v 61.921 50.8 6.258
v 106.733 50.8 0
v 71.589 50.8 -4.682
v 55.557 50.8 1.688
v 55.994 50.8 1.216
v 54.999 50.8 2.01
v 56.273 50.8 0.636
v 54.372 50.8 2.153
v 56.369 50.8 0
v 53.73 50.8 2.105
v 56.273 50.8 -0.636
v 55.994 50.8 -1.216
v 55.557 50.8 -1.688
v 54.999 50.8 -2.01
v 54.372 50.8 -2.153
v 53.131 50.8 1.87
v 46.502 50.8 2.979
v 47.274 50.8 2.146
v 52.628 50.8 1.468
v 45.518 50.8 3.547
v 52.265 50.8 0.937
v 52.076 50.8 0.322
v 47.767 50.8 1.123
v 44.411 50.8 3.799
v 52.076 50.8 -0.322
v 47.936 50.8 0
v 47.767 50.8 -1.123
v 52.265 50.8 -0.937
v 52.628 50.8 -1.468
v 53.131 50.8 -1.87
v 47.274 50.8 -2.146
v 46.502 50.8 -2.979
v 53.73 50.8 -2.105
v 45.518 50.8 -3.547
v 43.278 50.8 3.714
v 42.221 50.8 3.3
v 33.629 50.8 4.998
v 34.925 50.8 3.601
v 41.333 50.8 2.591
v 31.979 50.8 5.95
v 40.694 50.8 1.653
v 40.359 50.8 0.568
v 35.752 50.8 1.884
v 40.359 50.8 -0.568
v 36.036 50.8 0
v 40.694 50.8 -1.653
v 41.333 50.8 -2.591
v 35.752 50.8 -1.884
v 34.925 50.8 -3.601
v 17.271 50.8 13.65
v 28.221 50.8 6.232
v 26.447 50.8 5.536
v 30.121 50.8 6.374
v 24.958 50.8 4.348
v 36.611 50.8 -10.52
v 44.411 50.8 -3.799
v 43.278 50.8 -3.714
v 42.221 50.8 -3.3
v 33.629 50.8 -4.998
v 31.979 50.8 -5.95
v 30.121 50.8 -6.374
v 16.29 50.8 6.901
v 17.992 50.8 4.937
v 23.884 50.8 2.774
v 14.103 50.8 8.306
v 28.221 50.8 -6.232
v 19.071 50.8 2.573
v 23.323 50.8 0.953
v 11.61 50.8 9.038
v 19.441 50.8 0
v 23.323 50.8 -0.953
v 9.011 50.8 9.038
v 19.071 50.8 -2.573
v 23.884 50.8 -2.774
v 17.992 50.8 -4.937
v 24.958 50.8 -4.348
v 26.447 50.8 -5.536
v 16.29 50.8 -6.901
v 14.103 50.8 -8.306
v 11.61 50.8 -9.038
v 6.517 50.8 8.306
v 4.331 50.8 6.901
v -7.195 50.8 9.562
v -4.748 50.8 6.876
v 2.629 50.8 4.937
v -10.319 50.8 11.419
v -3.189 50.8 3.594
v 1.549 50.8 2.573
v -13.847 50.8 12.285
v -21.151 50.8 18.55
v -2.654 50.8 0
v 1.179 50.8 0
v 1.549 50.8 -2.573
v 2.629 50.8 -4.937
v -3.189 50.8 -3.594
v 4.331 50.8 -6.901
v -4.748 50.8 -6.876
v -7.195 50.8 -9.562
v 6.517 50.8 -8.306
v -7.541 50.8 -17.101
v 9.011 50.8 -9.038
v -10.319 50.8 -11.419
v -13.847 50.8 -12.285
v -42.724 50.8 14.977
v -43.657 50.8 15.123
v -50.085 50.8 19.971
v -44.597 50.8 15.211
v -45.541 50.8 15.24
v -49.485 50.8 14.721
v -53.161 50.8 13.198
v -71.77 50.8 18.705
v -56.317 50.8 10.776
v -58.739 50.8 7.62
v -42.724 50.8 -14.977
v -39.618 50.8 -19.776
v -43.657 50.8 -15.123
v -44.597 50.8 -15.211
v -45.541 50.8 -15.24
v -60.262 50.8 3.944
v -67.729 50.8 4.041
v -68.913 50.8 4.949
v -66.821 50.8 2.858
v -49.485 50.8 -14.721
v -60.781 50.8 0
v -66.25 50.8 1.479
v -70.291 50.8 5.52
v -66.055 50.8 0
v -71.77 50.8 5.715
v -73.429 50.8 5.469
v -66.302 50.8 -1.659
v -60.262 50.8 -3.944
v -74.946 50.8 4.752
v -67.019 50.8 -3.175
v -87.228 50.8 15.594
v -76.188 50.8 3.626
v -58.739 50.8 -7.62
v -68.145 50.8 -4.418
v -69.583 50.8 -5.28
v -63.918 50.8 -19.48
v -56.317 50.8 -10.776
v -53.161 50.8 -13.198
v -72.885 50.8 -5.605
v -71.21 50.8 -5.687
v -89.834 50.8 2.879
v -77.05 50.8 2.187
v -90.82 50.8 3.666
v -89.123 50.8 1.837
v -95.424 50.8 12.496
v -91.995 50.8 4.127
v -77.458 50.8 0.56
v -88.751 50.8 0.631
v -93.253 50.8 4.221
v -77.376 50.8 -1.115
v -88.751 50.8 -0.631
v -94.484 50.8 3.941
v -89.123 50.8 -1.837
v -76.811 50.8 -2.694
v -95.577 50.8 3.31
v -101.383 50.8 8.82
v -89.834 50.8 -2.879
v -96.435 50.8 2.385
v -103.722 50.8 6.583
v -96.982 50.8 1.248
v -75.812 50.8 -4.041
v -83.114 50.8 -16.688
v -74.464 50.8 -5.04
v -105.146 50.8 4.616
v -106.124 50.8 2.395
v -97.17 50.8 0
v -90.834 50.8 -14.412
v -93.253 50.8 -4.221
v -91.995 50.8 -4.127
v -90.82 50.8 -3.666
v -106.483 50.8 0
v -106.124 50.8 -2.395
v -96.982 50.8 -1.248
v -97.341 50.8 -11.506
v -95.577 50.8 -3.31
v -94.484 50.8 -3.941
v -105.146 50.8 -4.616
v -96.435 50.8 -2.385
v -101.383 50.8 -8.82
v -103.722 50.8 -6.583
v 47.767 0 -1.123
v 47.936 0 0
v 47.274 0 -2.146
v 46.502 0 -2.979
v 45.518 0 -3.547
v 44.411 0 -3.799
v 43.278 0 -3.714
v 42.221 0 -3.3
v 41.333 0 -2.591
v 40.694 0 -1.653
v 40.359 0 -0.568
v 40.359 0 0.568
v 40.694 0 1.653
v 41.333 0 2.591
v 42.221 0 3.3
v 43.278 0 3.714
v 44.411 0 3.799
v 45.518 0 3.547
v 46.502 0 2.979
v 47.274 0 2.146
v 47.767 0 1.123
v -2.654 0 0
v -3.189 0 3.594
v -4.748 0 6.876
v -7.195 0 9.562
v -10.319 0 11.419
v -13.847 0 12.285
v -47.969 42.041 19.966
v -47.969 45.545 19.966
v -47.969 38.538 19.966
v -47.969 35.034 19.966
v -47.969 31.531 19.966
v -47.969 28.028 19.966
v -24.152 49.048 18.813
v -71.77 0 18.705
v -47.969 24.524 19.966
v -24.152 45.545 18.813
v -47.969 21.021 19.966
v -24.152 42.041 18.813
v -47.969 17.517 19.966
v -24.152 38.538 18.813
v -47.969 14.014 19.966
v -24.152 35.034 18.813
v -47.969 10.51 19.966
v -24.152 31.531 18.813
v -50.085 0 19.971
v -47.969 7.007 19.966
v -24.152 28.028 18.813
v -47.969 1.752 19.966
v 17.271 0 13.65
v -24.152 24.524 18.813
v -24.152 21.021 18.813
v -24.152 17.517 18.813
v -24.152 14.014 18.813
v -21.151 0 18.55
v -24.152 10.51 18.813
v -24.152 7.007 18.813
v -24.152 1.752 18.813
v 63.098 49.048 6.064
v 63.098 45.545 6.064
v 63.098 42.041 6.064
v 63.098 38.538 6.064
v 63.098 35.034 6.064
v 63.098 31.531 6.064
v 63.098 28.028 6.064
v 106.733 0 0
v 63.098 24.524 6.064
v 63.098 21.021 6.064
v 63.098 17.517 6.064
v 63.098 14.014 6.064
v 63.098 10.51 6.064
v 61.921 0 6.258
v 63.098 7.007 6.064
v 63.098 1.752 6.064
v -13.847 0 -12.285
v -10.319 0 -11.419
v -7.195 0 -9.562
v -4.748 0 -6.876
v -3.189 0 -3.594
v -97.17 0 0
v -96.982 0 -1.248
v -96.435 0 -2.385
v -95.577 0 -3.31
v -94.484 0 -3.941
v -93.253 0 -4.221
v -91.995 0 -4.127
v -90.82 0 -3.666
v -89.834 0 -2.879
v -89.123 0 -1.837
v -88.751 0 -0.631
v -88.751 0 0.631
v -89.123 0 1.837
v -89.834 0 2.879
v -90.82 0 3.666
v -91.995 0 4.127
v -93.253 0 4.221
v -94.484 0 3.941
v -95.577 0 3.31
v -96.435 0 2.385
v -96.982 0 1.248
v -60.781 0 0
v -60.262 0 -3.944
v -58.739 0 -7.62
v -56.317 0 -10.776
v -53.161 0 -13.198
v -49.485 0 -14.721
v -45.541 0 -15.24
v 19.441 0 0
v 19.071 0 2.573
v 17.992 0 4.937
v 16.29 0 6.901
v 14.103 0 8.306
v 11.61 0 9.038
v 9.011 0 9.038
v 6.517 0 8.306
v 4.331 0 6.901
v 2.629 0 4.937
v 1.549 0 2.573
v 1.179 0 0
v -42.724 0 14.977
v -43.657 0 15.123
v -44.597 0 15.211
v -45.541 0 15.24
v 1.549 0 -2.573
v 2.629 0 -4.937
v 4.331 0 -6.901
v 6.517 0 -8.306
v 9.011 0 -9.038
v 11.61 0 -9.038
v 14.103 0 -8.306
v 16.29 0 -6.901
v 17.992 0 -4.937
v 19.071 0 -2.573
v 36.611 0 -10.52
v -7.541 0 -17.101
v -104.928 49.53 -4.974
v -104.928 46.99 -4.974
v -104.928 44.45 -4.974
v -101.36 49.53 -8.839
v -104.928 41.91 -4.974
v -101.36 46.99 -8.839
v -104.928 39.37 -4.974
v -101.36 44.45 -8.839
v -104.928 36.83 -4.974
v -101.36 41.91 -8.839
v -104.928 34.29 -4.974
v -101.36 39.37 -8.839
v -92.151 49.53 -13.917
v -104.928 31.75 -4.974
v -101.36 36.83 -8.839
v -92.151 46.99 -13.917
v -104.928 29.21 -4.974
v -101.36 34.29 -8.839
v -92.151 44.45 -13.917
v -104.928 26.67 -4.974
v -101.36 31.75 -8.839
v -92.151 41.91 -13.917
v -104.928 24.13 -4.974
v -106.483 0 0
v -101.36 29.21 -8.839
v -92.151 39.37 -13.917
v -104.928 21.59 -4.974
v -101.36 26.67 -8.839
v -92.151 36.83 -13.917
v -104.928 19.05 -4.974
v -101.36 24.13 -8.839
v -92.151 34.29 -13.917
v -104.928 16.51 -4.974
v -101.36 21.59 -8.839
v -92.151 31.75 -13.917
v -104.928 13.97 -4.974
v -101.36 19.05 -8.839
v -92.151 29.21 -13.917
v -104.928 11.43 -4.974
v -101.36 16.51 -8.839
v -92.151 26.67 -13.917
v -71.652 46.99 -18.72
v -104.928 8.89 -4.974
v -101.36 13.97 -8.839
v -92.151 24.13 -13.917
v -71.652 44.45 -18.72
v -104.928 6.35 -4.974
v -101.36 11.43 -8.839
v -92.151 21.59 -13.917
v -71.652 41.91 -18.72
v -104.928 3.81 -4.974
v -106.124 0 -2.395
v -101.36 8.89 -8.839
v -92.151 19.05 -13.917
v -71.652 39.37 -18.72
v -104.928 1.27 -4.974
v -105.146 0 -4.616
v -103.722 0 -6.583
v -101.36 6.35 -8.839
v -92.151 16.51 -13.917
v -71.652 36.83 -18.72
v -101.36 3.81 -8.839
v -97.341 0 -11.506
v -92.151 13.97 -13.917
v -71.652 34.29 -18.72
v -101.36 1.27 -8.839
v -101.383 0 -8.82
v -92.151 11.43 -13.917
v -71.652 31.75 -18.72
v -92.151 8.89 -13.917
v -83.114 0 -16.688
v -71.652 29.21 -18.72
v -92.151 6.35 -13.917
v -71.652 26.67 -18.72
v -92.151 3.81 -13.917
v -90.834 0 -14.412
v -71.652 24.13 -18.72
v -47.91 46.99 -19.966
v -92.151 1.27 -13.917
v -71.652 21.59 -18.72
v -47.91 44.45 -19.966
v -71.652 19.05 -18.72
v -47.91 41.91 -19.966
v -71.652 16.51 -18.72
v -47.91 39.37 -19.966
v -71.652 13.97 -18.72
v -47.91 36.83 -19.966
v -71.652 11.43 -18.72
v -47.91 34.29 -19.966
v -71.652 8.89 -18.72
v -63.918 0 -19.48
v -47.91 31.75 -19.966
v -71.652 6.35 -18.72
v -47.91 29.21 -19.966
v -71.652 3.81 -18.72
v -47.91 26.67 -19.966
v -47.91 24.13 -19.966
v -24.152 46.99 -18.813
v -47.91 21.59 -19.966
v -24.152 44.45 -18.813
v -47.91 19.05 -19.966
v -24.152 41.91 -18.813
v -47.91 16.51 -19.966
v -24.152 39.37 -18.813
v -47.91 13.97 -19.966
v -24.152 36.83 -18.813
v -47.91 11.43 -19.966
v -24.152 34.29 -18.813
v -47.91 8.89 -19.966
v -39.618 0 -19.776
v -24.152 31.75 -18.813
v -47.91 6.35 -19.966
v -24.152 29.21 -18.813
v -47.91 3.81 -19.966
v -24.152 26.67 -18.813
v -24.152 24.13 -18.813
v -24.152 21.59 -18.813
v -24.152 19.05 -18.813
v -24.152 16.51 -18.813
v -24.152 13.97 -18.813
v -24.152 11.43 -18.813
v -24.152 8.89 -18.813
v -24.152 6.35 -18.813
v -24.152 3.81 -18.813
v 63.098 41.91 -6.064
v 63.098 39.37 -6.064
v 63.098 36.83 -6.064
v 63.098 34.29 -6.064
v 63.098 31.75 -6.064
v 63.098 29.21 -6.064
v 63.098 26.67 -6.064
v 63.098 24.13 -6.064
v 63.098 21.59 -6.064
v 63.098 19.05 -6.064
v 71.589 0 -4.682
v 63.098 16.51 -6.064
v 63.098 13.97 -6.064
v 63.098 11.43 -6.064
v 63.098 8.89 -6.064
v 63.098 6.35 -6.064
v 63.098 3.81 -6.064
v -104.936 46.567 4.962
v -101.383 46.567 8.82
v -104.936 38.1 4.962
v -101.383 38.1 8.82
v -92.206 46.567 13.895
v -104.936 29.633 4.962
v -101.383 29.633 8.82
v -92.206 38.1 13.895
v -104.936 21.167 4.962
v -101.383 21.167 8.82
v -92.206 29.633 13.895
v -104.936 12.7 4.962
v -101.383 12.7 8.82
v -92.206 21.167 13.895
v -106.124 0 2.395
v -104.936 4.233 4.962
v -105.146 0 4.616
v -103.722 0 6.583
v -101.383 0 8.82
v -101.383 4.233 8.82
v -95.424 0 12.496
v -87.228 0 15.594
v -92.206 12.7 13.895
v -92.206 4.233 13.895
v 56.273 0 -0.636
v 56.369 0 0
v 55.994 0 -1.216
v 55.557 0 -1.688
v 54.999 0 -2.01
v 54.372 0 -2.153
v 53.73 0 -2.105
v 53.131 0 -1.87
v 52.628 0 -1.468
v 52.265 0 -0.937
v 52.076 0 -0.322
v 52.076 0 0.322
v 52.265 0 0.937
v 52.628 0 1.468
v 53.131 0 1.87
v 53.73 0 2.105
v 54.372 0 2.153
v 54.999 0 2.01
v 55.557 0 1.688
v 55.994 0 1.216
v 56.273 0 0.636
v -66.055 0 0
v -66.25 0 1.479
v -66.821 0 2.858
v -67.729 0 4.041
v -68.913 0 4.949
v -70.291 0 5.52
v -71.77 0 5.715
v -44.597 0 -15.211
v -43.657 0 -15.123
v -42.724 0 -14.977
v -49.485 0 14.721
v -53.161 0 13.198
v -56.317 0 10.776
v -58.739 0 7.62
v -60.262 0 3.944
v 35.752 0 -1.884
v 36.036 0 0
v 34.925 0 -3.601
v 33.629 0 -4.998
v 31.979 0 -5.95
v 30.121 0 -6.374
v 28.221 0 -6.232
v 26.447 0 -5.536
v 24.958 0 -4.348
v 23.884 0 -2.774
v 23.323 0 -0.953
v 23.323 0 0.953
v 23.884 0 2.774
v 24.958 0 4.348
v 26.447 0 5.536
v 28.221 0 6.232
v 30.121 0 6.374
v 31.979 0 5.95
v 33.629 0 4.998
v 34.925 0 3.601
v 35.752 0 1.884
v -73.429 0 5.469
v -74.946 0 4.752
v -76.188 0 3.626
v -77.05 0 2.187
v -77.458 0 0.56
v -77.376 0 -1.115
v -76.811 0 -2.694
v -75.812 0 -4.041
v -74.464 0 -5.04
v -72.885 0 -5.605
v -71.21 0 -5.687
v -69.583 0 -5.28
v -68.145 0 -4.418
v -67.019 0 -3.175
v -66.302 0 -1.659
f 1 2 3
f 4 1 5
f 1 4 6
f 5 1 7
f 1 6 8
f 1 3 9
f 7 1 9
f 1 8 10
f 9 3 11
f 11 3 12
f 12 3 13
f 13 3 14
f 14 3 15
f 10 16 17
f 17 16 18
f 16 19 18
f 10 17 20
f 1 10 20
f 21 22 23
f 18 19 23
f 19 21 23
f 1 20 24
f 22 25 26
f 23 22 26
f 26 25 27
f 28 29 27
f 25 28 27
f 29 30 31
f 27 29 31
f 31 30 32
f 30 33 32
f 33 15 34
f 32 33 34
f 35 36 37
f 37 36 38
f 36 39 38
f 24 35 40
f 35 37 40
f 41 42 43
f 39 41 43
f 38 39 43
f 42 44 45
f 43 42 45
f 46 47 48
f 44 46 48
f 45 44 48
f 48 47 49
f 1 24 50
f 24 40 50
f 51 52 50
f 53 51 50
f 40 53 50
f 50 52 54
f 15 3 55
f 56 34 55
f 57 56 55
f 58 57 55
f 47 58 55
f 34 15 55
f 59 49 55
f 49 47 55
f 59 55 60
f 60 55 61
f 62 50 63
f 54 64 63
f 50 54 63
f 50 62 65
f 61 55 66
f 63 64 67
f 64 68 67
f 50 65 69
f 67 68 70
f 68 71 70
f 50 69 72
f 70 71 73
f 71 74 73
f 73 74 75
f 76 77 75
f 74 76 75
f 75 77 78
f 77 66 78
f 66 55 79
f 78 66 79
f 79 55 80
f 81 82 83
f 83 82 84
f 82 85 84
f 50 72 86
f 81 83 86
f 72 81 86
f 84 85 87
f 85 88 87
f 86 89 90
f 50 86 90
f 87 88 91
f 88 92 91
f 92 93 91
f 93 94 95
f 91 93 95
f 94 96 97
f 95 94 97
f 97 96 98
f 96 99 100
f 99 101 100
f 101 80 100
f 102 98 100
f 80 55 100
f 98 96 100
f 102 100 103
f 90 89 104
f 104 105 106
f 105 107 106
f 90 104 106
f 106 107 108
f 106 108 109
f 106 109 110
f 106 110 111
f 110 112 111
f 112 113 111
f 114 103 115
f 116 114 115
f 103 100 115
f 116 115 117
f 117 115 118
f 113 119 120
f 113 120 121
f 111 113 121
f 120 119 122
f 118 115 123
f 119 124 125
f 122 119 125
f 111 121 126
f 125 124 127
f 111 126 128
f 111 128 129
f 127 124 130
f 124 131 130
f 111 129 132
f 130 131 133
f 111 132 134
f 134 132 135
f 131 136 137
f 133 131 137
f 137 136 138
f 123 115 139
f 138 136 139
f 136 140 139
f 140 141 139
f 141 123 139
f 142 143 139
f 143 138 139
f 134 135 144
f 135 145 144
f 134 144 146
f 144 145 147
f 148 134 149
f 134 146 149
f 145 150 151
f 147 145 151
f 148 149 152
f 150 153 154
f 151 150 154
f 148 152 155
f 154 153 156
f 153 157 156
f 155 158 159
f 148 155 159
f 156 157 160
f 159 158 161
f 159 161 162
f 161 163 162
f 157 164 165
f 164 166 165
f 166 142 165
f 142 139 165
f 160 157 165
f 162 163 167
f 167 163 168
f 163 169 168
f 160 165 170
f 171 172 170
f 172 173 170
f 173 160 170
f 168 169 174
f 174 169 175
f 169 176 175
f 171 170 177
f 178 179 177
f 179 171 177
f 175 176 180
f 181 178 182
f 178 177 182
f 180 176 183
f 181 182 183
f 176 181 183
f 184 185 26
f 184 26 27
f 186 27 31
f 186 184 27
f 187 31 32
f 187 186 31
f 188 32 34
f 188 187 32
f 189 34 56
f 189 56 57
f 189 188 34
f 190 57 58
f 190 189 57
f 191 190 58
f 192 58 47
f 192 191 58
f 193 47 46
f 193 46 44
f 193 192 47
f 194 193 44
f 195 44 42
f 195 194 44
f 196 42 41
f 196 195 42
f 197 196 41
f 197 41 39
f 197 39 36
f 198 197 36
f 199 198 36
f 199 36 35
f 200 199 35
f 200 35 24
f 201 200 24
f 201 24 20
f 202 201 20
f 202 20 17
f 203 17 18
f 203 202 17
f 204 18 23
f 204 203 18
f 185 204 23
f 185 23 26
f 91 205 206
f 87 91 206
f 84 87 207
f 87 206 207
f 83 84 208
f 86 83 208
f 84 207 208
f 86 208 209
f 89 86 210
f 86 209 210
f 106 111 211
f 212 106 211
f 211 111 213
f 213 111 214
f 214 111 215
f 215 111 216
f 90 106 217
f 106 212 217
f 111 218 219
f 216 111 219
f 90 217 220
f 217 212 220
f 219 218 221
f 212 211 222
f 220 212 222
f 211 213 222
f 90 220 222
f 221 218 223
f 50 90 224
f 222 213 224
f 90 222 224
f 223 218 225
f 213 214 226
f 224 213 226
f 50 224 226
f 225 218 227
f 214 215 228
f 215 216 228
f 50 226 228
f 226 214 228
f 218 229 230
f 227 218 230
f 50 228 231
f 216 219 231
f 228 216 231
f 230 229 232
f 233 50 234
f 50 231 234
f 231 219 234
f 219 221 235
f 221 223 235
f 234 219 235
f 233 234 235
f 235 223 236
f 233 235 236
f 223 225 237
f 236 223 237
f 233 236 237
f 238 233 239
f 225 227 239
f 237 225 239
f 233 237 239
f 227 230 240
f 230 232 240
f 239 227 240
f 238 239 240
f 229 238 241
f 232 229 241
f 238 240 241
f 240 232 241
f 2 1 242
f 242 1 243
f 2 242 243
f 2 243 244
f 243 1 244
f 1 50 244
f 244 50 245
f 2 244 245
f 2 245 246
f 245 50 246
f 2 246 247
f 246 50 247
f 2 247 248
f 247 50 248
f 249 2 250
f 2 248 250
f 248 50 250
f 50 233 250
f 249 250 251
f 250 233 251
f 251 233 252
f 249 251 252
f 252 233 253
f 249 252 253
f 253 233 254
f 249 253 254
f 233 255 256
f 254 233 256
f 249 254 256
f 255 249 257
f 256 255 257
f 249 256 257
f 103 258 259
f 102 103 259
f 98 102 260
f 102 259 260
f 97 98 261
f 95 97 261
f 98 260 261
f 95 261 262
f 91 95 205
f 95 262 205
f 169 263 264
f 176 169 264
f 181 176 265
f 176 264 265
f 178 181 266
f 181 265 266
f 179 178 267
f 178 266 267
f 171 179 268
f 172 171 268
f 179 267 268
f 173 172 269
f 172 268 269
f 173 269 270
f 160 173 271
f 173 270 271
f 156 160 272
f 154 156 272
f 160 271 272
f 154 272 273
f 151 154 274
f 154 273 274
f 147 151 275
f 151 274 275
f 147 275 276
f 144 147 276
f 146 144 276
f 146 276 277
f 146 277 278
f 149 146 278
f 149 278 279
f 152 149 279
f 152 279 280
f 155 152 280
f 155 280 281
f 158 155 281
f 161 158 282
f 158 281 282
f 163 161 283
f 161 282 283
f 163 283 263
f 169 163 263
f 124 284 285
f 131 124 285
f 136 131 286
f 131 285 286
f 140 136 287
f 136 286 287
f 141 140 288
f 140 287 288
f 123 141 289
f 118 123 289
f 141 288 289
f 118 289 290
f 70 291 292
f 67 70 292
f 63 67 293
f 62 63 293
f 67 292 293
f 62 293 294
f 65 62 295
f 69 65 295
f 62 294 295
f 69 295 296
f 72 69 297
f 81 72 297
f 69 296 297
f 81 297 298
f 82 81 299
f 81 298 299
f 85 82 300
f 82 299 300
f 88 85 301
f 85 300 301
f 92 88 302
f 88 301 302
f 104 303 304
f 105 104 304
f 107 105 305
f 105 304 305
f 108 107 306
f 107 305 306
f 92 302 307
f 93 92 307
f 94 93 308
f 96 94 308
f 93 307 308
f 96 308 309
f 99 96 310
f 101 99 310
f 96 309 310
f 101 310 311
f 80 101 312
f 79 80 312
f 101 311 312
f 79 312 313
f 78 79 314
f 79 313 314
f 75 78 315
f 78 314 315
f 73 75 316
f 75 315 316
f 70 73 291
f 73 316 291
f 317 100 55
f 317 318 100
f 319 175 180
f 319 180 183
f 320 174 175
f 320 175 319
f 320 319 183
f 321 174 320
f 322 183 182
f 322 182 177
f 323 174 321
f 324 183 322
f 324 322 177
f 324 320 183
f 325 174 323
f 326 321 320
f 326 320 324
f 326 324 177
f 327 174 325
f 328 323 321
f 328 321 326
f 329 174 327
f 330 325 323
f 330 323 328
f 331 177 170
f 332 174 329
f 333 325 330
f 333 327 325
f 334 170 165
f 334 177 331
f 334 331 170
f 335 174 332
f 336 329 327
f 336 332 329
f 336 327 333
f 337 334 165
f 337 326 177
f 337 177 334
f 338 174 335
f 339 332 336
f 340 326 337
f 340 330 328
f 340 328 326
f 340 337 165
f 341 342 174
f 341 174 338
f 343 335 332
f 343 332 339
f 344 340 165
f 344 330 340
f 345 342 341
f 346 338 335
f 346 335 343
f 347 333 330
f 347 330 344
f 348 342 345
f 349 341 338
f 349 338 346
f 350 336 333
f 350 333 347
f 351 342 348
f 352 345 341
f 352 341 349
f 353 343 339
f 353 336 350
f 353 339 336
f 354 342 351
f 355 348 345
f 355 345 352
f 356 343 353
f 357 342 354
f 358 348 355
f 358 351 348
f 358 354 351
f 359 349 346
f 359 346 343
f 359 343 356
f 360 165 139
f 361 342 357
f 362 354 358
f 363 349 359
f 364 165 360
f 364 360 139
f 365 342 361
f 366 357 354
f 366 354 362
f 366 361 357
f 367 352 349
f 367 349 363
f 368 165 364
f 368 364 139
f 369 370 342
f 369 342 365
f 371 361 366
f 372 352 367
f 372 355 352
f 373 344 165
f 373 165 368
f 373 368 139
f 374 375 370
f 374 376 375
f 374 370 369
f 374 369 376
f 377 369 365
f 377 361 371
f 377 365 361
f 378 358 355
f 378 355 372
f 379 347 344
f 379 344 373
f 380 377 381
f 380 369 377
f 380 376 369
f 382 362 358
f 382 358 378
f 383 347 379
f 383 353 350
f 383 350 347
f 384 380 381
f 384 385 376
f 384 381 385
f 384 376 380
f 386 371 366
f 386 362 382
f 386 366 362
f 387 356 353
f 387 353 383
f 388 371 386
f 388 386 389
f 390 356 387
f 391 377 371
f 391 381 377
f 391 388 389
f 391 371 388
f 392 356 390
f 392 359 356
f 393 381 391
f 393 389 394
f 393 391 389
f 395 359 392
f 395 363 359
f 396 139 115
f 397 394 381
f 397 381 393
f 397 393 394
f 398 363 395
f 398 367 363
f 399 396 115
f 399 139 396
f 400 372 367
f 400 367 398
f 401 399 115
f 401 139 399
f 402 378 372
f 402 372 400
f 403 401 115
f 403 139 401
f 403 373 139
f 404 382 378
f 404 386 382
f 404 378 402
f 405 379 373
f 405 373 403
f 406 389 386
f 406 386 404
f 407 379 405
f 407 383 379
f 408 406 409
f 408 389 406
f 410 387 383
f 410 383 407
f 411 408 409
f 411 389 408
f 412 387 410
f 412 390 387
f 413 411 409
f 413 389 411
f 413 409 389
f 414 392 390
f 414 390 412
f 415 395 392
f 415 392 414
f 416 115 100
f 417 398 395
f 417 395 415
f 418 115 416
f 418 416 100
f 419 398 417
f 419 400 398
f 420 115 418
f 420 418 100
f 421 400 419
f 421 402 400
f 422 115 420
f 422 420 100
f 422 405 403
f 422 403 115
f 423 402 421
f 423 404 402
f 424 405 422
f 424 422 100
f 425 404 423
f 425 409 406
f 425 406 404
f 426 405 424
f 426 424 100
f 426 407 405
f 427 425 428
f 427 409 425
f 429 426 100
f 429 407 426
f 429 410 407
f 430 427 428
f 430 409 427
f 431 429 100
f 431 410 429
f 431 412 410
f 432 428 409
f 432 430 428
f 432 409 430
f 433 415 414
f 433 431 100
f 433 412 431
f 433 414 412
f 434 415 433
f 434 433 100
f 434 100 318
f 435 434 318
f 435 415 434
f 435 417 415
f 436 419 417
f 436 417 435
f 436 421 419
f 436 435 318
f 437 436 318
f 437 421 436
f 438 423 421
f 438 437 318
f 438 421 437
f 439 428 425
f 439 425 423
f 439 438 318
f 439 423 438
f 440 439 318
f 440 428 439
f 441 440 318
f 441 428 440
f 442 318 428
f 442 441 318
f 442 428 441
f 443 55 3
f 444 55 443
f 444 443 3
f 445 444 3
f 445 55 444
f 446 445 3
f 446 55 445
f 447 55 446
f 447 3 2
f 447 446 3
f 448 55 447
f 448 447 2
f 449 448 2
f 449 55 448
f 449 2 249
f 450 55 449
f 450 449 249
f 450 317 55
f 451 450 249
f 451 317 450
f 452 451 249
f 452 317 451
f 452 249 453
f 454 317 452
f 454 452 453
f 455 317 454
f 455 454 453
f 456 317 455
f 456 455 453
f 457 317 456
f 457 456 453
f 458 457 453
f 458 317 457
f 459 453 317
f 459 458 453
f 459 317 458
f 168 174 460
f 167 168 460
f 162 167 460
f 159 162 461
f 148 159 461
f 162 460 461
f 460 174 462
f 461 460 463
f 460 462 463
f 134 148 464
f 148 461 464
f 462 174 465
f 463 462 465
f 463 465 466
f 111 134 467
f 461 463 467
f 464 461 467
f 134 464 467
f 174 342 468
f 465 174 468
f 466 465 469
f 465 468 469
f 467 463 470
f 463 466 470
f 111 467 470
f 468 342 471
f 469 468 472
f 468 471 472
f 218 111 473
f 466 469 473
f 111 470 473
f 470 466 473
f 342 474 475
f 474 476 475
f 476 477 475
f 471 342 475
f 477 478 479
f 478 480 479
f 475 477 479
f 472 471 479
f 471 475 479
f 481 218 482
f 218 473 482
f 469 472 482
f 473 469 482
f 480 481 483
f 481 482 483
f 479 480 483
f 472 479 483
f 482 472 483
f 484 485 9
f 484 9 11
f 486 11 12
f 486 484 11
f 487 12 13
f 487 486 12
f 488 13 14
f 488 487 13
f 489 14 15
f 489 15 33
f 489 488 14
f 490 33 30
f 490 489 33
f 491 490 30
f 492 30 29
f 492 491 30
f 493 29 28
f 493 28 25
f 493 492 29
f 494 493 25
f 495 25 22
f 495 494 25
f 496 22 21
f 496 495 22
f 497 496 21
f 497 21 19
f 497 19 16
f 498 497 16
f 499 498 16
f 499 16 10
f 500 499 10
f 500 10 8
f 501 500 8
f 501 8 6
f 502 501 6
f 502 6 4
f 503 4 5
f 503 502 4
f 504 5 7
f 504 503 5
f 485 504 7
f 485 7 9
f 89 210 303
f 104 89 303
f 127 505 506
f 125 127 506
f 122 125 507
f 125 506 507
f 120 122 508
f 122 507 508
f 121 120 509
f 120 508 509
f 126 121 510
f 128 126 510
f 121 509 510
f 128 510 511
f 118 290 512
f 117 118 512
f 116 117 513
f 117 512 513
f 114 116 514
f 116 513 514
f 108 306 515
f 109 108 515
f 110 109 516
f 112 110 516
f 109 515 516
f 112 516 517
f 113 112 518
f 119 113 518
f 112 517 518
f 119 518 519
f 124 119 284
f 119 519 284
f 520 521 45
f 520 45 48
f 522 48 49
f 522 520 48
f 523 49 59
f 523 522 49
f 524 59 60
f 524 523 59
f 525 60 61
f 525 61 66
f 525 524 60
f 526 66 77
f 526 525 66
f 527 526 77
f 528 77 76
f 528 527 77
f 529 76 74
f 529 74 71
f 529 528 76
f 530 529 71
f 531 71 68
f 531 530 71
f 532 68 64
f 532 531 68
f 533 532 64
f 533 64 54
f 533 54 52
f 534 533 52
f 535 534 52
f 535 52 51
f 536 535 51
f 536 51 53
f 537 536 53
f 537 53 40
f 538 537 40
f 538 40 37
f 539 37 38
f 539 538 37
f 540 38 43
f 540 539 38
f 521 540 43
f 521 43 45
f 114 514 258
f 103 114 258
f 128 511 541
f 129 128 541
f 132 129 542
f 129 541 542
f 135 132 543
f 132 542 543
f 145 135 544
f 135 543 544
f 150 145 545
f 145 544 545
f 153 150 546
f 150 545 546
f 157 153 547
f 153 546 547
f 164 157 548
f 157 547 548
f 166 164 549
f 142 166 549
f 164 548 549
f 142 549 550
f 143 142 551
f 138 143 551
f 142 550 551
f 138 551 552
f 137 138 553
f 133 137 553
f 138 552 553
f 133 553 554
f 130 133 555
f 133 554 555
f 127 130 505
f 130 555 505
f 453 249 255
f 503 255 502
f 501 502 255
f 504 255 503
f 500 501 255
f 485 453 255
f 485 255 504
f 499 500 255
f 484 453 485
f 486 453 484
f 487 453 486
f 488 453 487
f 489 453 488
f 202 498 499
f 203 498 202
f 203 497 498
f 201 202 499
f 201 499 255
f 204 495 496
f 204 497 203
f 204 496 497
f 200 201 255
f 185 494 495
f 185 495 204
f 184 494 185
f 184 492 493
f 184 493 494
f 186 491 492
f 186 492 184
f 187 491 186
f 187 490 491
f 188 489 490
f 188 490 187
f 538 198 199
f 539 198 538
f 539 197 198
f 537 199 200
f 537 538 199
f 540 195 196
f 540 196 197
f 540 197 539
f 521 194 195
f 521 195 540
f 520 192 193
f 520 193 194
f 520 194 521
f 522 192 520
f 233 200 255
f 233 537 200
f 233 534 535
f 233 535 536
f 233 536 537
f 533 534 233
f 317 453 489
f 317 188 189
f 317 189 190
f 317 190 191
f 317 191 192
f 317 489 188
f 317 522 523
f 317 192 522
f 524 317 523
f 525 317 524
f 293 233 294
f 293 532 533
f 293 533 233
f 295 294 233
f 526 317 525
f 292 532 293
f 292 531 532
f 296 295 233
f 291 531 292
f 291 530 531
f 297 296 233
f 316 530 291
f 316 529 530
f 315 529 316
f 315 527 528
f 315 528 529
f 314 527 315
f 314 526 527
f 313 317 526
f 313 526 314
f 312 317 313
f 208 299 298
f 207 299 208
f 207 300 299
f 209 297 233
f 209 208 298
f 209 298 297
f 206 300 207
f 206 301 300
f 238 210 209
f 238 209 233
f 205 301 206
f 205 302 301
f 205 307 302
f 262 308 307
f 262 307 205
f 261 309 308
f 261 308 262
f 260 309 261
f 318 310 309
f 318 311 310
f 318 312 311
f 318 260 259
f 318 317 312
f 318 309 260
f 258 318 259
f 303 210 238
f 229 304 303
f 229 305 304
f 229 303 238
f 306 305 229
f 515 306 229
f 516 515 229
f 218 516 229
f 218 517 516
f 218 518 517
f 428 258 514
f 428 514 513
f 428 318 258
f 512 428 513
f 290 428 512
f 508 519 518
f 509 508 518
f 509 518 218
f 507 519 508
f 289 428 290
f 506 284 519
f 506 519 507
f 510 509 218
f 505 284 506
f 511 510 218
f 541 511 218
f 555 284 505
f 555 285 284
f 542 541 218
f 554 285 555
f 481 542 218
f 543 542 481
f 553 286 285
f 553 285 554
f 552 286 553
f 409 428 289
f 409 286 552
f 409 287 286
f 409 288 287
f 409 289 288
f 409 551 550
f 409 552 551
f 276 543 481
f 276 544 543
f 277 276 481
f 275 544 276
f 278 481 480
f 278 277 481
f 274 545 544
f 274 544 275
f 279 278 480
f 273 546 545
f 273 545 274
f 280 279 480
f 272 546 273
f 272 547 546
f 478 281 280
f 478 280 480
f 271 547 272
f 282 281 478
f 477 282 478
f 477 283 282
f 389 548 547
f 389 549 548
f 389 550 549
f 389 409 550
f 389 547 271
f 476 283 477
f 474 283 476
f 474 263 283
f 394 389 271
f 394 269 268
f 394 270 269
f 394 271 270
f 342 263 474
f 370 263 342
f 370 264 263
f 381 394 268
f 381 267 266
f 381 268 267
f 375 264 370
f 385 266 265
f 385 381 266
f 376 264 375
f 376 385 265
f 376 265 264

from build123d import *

# Parameters (mm, degrees)
SKETCH1_R           = 6.392333333
SKETCH1_R_2         = 3.81
SKETCH1_R_3         = 2.159
BOSS_EXTRUDE1_DEPTH = 50.8


with BuildPart() as part:
    # Sketch1 → Boss-Extrude1 (new body)
    with BuildSketch(Plane(origin=(0, 0, 0), x_dir=(1, 0, 0), z_dir=(0, 1, 0))):
        with BuildLine():
            add(Edge.make_bspline(
                [(-106.482983395, 7e-09), (-106.481988205, 0.336221447), (-106.427915569, 1.172470852), (-106.105951464, 2.643099269), (-105.314009735, 4.475217408), (-103.897531119, 6.504348419), (-101.808045378, 8.571651332), (-99.066717841, 10.567556704), (-95.719803188, 12.4267473), (-91.817332429, 14.111441711), (-87.406701835, 15.599318162), (-82.531907012, 16.877133323), (-77.234149654, 17.93743562), (-71.552607098, 18.776740572), (-65.525147606, 19.395460586), (-59.188591418, 19.79657403), (-52.57905308, 19.986276316), (-45.732001964, 19.972865837), (-38.682363694, 19.76732247), (-31.464522928, 19.382552478), (-24.112335149, 18.833317467), (-16.659115821, 18.136000968), (-9.137634043, 17.308302017), (-1.580112881, 16.368906014), (5.98177291, 15.337213534), (13.516891029, 14.232999407), (20.994645609, 13.076129848), (28.384968739, 11.886210001), (35.658323251, 10.682336314), (42.785702907, 9.482759124), (49.738647425, 8.304637787), (56.489265684, 7.163760718), (63.010281114, 6.074356699), (69.275076728, 5.048841412), (75.257781106, 4.097692071), (80.933343311, 3.229317249), (86.277669376, 2.449846213), (91.267618323, 1.763292049), (95.881607116, 1.17122476), (100.098099776, 0.673119164), (103.673185129, 0.290516392), (105.83614122, 0.081745654), (106.733370691, 7e-09)],
                knots=[0.5, 0.5, 0.5, 0.5, 0.502166769, 0.505390167, 0.509655974, 0.514947682, 0.521244711, 0.528520886, 0.536744945, 0.54588136, 0.555890751, 0.566730119, 0.57835299, 0.590709588, 0.603747039, 0.617409572, 0.631638768, 0.646373793, 0.661551658, 0.677107483, 0.692974771, 0.709085713, 0.725371443, 0.741762353, 0.758188398, 0.774579367, 0.790865214, 0.806976332, 0.822843867, 0.838400002, 0.853578262, 0.868313774, 0.882543568, 0.896206835, 0.909245173, 0.92160287, 0.933227116, 0.944068236, 0.954079898, 0.963219316, 0.971447445, 0.977251074, 0.977251074, 0.977251074, 0.977251074], degree=3))
            add(Edge.make_bspline(
                [(-106.482983395, -7e-09), (-106.481988205, -0.336221447), (-106.427915569, -1.172470852), (-106.105951463, -2.643099269), (-105.314009735, -4.475217408), (-103.897531118, -6.504348419), (-101.808045378, -8.571651332), (-99.06671784, -10.567556704), (-95.719803188, -12.4267473), (-91.817332429, -14.111441711), (-87.406701835, -15.599318162), (-82.531907011, -16.877133323), (-77.273170777, -17.929625865), (-73.632382766, -18.469484174), (-71.77044662, -18.70528518)],
                knots=[0.5, 0.5, 0.5, 0.5, 0.502166769, 0.505390167, 0.509655974, 0.514947682, 0.521244711, 0.528520886, 0.536744945, 0.54588136, 0.555890751, 0.566730119, 0.57835299, 0.590453127, 0.590453127, 0.590453127, 0.590453127], degree=3))
            add(Edge.make_bspline(
                [(-71.77044662, -18.70528518), (-71.730983039, -18.710282963), (-69.685237287, -18.968426485), (-65.525147605, -19.395460586), (-59.188591417, -19.79657403), (-52.57905308, -19.986276316), (-45.732001964, -19.972865837), (-38.682363694, -19.76732247), (-31.464522928, -19.382552478), (-24.112335148, -18.833317467), (-16.659115821, -18.136000968), (-9.137634043, -17.308302017), (-1.580112881, -16.368906014), (5.98177291, -15.337213534), (13.516891029, -14.232999407), (20.99464561, -13.076129848), (28.384968739, -11.886210001), (35.658323251, -10.682336314), (42.785702907, -9.482759124), (49.738647426, -8.304637787), (56.489265684, -7.163760718), (63.010281115, -6.074356699), (69.275076728, -5.048841412), (75.257781106, -4.097692071), (80.933343311, -3.229317249), (86.277669376, -2.449846213), (91.267618323, -1.763292049), (95.881607116, -1.17122476), (100.098099776, -0.673119164), (103.673185129, -0.290516392), (105.83614122, -0.081745654), (106.733370691, -7e-09)],
                knots=[0.590453127, 0.590453127, 0.590453127, 0.590453127, 0.590709588, 0.603747039, 0.617409572, 0.631638768, 0.646373793, 0.661551658, 0.677107483, 0.692974771, 0.709085713, 0.725371443, 0.741762353, 0.758188398, 0.774579367, 0.790865214, 0.806976332, 0.822843867, 0.838400002, 0.853578262, 0.868313774, 0.882543568, 0.896206835, 0.909245173, 0.92160287, 0.933227116, 0.944068236, 0.954079898, 0.963219316, 0.971447445, 0.977251074, 0.977251074, 0.977251074, 0.977251074], degree=3))
        make_face()
        with BuildLine():
            ThreePointArc((-88.703779951, 0), (-92.937113284, -4.233333333), (-97.170446617, 0))
            ThreePointArc((-97.170446617, 0), (-92.937113284, 4.233333333), (-88.703779951, 0))
        make_face(mode=Mode.SUBTRACT)
        with BuildLine():
            ThreePointArc((-66.05544662, 0), (-67.729331365, -4.041115254), (-71.77044662, -5.715))
            ThreePointArc((-71.77044662, -5.715), (-75.811561874, 4.041115254), (-66.05544662, 0))
        make_face(mode=Mode.SUBTRACT)
        with BuildLine():
            ThreePointArc((-45.540838593, -15.24), (-56.317145938, -10.776307345), (-60.780838593, 0))
            ThreePointArc((-60.780838593, 0), (-56.317145938, 10.776307345), (-45.540838593, 15.24))
            ThreePointArc((-45.540838593, 15.24), (-44.126098565, 15.174192257), (-42.723576496, 14.977337356))
            Line((-42.723576496, 14.977337356), (-13.847320134, 12.285108666))
            ThreePointArc((-13.847320134, 12.285108666), (-5.872176435, 8.309742362), (-2.65431439, 0))
            ThreePointArc((-2.65431439, 0), (-5.872176435, -8.309742362), (-13.847320134, -12.285108666))
            Line((-13.847320134, -12.285108666), (-42.723576496, -14.977337356))
            ThreePointArc((-42.723576496, -14.977337356), (-44.126098565, -15.174192257), (-45.540838593, -15.24))
        make_face(mode=Mode.SUBTRACT)
        with BuildLine():
            ThreePointArc((19.441184097, 0), (10.310172634, -9.131011462), (1.179161172, 0))
            ThreePointArc((1.179161172, 0), (10.310172634, 9.131011462), (19.441184097, 0))
        make_face(mode=Mode.SUBTRACT)
        with Locations((29.643517429, 0)):
            Circle(SKETCH1_R, mode=Mode.SUBTRACT)
        with Locations((44.126269567, 0)):
            Circle(SKETCH1_R_2, mode=Mode.SUBTRACT)
        with Locations((54.210398224, 0)):
            Circle(SKETCH1_R_3, mode=Mode.SUBTRACT)
    extrude(amount=BOSS_EXTRUDE1_DEPTH)


solid = part.part
